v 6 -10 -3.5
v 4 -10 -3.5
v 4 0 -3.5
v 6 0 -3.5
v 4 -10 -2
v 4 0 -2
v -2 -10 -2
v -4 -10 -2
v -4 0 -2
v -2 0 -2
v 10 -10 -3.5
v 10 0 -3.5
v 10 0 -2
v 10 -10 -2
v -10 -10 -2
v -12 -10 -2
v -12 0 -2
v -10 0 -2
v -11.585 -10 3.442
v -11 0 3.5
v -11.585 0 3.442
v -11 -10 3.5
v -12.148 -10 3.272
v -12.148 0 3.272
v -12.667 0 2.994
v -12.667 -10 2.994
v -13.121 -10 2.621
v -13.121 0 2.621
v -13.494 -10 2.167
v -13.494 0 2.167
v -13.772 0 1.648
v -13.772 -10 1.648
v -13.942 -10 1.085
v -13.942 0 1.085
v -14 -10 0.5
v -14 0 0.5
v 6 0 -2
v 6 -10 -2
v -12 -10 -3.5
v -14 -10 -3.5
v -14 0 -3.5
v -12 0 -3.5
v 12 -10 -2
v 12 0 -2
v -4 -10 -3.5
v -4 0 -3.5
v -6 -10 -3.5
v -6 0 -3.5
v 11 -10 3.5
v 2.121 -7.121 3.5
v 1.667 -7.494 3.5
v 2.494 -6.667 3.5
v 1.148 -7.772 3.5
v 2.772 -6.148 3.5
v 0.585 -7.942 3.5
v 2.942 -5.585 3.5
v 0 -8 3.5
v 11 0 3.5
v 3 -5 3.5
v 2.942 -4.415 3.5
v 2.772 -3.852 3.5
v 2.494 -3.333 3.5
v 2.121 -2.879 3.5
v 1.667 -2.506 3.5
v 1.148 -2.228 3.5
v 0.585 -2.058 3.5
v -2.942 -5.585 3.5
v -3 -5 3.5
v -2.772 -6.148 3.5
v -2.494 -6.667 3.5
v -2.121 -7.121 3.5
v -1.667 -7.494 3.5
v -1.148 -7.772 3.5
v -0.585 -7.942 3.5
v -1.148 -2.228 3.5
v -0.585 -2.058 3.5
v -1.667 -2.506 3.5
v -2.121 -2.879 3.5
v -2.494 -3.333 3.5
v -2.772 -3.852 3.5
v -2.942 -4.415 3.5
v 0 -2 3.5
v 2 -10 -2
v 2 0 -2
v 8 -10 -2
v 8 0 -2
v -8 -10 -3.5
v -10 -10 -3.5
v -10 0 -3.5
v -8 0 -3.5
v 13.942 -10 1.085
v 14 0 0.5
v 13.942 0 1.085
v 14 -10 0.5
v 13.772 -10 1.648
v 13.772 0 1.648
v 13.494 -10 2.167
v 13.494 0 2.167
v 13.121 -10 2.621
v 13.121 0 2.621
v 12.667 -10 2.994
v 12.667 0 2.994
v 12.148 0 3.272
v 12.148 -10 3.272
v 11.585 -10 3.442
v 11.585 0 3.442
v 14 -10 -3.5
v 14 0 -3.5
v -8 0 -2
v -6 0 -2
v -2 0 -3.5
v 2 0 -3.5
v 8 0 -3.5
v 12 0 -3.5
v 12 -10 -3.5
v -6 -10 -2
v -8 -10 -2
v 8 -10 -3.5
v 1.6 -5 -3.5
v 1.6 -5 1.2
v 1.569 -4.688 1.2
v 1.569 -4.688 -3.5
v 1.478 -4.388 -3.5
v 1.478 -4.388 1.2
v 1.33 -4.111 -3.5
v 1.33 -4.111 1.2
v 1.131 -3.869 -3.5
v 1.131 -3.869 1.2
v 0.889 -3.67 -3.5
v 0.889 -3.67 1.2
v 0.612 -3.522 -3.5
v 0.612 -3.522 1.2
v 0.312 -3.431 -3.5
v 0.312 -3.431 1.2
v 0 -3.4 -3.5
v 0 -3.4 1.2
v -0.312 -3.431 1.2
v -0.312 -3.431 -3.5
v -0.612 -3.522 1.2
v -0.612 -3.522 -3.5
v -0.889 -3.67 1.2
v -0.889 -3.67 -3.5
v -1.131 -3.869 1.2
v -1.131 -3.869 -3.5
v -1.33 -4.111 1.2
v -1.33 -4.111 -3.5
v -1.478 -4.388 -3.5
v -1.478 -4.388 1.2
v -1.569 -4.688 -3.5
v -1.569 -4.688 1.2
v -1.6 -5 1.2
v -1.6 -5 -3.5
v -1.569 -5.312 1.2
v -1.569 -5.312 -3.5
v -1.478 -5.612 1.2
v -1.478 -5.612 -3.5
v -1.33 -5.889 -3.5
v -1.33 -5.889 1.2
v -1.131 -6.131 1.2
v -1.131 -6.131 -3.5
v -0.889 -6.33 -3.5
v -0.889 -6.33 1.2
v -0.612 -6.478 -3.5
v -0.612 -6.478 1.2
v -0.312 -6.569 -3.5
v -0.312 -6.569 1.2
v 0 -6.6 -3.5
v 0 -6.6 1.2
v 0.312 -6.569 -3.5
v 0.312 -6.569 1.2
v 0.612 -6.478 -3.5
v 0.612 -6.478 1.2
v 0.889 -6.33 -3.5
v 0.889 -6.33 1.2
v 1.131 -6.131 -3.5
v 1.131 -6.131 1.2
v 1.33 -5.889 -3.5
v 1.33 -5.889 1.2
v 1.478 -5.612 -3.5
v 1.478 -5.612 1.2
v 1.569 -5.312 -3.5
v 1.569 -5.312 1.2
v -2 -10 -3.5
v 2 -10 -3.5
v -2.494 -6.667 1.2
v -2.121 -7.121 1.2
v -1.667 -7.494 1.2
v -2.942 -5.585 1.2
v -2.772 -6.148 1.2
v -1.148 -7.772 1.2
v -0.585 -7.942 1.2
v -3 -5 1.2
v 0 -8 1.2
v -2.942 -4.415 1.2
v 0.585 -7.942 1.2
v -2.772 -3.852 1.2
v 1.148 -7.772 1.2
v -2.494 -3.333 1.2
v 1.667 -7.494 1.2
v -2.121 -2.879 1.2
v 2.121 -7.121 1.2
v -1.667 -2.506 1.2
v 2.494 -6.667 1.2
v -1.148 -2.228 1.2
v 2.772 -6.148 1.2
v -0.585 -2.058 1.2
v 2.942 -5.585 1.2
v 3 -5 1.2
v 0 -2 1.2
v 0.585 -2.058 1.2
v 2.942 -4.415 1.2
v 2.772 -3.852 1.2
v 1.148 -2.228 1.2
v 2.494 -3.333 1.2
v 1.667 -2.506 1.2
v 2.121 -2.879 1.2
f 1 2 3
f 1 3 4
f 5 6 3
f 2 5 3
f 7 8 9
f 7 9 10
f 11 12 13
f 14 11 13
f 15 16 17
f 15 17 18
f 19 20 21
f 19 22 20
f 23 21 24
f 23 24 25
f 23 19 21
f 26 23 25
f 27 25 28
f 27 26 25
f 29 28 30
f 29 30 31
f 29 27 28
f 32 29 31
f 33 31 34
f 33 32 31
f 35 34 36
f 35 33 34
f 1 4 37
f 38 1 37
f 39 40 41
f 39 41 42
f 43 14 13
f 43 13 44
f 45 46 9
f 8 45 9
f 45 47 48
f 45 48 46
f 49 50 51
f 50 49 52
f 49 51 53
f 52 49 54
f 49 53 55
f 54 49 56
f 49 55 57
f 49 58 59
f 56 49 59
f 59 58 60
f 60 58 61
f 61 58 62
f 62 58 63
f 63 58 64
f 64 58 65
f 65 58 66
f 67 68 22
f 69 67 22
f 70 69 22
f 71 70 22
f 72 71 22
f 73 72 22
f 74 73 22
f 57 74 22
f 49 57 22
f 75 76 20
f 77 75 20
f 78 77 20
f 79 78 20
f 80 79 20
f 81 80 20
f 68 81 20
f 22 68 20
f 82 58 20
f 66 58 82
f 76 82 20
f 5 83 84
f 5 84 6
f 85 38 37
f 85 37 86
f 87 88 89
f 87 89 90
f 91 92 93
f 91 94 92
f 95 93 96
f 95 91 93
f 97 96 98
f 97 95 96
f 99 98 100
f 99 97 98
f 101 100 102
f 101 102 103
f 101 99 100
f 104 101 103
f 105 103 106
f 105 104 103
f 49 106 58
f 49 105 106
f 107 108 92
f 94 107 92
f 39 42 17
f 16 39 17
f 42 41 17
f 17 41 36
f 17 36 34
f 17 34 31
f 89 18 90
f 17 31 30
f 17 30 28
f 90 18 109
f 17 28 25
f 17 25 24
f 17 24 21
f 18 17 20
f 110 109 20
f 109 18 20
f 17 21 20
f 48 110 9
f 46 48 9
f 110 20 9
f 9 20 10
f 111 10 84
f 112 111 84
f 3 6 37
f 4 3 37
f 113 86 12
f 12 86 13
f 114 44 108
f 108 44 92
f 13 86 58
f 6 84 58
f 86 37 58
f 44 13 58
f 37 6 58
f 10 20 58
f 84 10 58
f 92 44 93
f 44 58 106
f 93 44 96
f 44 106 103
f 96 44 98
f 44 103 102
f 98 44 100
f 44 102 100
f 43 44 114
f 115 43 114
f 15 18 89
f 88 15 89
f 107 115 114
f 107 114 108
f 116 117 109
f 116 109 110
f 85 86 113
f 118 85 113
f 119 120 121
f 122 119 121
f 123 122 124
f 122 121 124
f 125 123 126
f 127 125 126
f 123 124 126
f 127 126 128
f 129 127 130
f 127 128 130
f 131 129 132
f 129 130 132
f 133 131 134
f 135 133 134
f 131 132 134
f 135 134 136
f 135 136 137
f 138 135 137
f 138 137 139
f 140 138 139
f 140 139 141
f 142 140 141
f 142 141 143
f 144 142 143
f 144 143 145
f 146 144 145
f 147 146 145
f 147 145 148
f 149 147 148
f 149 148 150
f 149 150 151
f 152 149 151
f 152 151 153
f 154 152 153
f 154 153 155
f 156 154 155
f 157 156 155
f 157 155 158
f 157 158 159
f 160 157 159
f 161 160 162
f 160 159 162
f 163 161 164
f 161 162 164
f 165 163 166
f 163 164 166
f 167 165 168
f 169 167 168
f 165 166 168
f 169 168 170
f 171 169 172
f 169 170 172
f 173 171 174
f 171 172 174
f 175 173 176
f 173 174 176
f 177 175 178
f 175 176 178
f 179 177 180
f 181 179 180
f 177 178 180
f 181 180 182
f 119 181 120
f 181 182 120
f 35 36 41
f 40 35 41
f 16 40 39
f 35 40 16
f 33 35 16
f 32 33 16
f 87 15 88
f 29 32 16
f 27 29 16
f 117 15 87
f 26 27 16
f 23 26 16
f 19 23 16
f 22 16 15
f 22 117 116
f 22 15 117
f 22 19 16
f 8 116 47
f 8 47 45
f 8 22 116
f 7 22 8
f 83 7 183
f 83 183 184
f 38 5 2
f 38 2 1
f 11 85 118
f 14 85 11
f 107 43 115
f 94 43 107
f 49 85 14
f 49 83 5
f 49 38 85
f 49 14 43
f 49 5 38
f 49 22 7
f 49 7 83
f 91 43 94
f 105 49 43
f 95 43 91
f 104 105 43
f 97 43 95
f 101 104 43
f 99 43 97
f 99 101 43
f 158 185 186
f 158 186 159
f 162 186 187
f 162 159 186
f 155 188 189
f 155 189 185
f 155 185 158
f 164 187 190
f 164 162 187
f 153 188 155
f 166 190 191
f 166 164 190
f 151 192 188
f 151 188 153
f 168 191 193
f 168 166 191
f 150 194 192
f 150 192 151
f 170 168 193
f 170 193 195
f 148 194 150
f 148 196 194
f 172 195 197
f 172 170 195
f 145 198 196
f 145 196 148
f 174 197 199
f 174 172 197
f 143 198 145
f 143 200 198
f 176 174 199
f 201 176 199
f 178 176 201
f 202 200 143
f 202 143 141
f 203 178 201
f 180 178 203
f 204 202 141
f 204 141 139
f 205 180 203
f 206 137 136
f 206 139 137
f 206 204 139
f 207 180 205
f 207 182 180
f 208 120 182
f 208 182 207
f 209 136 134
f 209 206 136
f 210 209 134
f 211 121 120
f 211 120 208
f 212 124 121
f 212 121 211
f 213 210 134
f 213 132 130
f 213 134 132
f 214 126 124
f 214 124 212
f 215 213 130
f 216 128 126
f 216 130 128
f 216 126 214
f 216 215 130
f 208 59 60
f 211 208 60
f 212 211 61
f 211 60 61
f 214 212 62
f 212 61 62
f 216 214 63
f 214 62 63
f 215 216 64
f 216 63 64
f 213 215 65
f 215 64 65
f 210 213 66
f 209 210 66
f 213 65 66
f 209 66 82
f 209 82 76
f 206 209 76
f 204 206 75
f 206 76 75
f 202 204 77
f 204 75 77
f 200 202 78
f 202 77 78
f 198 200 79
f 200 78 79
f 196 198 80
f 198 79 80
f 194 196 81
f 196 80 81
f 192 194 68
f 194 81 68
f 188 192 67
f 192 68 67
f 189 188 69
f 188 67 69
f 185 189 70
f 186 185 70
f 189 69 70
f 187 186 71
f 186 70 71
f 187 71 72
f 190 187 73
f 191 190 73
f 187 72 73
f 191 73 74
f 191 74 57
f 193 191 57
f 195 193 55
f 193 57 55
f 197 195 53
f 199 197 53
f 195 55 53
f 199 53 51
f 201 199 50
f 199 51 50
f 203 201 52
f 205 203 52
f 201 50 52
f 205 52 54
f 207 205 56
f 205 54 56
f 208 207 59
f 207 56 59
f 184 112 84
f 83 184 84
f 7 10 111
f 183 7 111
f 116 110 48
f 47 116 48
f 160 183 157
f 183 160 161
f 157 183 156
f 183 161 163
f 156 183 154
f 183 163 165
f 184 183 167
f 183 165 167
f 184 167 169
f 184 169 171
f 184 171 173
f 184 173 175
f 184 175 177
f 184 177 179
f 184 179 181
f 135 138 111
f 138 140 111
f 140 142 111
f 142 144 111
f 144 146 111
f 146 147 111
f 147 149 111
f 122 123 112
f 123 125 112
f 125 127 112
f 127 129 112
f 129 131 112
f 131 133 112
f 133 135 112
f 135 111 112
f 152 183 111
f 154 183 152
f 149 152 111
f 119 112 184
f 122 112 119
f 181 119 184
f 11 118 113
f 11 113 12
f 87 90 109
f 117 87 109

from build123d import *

# Parameters (mm, degrees)
F1_DEPTH = 10
F2_R     = 1.6
F3_DEPTH = 25
F2_R_2   = 3
F4_DEPTH = 2.3
F5_R     = 3


with BuildPart() as f1:
    # F0 (on Front) → F1 (new body)
    with BuildSketch(Plane.XZ):
        Polygon((12, -3.5), (14, -3.5), (14, 3.5), (-14, 3.5), (-14, -3.5), (-12, -3.5), (-12, -2), (-10, -2), (-10, -3.5), (-8, -3.5), (-8, -2), (-6, -2), (-6, -3.5), (-4, -3.5), (-4, -2), (-2, -2), (-2, -3.5), (2, -3.5), (2, -2), (4, -2), (4, -3.5), (6, -3.5), (6, -2), (8, -2), (8, -3.5), (10, -3.5), (10, -2), (12, -2), align=None)
    extrude(amount=F1_DEPTH)

    # F2 (on face) → F3 (cut)
    with BuildSketch(Plane.XY.offset(3.5)):
        with Locations((0, -5)):
            Circle(F2_R)
    extrude(amount=-F3_DEPTH, mode=Mode.SUBTRACT)

    # F2 (on face) → F4 (cut)
    with BuildSketch(Plane.XY.offset(3.5)):
        with Locations((0, -5)):
            Circle(F2_R_2)
        with Locations((0, -5)):
            Circle(F2_R, mode=Mode.SUBTRACT)
    extrude(amount=-F4_DEPTH, mode=Mode.SUBTRACT)

    # F5
    f5_edges = [f1.edges().sort_by_distance(p)[0] for p in [
        (-14, -5, 3.5),
        (14, -5, 3.5),
    ]]
    fillet(f5_edges, radius=F5_R)


solid = f1.part
